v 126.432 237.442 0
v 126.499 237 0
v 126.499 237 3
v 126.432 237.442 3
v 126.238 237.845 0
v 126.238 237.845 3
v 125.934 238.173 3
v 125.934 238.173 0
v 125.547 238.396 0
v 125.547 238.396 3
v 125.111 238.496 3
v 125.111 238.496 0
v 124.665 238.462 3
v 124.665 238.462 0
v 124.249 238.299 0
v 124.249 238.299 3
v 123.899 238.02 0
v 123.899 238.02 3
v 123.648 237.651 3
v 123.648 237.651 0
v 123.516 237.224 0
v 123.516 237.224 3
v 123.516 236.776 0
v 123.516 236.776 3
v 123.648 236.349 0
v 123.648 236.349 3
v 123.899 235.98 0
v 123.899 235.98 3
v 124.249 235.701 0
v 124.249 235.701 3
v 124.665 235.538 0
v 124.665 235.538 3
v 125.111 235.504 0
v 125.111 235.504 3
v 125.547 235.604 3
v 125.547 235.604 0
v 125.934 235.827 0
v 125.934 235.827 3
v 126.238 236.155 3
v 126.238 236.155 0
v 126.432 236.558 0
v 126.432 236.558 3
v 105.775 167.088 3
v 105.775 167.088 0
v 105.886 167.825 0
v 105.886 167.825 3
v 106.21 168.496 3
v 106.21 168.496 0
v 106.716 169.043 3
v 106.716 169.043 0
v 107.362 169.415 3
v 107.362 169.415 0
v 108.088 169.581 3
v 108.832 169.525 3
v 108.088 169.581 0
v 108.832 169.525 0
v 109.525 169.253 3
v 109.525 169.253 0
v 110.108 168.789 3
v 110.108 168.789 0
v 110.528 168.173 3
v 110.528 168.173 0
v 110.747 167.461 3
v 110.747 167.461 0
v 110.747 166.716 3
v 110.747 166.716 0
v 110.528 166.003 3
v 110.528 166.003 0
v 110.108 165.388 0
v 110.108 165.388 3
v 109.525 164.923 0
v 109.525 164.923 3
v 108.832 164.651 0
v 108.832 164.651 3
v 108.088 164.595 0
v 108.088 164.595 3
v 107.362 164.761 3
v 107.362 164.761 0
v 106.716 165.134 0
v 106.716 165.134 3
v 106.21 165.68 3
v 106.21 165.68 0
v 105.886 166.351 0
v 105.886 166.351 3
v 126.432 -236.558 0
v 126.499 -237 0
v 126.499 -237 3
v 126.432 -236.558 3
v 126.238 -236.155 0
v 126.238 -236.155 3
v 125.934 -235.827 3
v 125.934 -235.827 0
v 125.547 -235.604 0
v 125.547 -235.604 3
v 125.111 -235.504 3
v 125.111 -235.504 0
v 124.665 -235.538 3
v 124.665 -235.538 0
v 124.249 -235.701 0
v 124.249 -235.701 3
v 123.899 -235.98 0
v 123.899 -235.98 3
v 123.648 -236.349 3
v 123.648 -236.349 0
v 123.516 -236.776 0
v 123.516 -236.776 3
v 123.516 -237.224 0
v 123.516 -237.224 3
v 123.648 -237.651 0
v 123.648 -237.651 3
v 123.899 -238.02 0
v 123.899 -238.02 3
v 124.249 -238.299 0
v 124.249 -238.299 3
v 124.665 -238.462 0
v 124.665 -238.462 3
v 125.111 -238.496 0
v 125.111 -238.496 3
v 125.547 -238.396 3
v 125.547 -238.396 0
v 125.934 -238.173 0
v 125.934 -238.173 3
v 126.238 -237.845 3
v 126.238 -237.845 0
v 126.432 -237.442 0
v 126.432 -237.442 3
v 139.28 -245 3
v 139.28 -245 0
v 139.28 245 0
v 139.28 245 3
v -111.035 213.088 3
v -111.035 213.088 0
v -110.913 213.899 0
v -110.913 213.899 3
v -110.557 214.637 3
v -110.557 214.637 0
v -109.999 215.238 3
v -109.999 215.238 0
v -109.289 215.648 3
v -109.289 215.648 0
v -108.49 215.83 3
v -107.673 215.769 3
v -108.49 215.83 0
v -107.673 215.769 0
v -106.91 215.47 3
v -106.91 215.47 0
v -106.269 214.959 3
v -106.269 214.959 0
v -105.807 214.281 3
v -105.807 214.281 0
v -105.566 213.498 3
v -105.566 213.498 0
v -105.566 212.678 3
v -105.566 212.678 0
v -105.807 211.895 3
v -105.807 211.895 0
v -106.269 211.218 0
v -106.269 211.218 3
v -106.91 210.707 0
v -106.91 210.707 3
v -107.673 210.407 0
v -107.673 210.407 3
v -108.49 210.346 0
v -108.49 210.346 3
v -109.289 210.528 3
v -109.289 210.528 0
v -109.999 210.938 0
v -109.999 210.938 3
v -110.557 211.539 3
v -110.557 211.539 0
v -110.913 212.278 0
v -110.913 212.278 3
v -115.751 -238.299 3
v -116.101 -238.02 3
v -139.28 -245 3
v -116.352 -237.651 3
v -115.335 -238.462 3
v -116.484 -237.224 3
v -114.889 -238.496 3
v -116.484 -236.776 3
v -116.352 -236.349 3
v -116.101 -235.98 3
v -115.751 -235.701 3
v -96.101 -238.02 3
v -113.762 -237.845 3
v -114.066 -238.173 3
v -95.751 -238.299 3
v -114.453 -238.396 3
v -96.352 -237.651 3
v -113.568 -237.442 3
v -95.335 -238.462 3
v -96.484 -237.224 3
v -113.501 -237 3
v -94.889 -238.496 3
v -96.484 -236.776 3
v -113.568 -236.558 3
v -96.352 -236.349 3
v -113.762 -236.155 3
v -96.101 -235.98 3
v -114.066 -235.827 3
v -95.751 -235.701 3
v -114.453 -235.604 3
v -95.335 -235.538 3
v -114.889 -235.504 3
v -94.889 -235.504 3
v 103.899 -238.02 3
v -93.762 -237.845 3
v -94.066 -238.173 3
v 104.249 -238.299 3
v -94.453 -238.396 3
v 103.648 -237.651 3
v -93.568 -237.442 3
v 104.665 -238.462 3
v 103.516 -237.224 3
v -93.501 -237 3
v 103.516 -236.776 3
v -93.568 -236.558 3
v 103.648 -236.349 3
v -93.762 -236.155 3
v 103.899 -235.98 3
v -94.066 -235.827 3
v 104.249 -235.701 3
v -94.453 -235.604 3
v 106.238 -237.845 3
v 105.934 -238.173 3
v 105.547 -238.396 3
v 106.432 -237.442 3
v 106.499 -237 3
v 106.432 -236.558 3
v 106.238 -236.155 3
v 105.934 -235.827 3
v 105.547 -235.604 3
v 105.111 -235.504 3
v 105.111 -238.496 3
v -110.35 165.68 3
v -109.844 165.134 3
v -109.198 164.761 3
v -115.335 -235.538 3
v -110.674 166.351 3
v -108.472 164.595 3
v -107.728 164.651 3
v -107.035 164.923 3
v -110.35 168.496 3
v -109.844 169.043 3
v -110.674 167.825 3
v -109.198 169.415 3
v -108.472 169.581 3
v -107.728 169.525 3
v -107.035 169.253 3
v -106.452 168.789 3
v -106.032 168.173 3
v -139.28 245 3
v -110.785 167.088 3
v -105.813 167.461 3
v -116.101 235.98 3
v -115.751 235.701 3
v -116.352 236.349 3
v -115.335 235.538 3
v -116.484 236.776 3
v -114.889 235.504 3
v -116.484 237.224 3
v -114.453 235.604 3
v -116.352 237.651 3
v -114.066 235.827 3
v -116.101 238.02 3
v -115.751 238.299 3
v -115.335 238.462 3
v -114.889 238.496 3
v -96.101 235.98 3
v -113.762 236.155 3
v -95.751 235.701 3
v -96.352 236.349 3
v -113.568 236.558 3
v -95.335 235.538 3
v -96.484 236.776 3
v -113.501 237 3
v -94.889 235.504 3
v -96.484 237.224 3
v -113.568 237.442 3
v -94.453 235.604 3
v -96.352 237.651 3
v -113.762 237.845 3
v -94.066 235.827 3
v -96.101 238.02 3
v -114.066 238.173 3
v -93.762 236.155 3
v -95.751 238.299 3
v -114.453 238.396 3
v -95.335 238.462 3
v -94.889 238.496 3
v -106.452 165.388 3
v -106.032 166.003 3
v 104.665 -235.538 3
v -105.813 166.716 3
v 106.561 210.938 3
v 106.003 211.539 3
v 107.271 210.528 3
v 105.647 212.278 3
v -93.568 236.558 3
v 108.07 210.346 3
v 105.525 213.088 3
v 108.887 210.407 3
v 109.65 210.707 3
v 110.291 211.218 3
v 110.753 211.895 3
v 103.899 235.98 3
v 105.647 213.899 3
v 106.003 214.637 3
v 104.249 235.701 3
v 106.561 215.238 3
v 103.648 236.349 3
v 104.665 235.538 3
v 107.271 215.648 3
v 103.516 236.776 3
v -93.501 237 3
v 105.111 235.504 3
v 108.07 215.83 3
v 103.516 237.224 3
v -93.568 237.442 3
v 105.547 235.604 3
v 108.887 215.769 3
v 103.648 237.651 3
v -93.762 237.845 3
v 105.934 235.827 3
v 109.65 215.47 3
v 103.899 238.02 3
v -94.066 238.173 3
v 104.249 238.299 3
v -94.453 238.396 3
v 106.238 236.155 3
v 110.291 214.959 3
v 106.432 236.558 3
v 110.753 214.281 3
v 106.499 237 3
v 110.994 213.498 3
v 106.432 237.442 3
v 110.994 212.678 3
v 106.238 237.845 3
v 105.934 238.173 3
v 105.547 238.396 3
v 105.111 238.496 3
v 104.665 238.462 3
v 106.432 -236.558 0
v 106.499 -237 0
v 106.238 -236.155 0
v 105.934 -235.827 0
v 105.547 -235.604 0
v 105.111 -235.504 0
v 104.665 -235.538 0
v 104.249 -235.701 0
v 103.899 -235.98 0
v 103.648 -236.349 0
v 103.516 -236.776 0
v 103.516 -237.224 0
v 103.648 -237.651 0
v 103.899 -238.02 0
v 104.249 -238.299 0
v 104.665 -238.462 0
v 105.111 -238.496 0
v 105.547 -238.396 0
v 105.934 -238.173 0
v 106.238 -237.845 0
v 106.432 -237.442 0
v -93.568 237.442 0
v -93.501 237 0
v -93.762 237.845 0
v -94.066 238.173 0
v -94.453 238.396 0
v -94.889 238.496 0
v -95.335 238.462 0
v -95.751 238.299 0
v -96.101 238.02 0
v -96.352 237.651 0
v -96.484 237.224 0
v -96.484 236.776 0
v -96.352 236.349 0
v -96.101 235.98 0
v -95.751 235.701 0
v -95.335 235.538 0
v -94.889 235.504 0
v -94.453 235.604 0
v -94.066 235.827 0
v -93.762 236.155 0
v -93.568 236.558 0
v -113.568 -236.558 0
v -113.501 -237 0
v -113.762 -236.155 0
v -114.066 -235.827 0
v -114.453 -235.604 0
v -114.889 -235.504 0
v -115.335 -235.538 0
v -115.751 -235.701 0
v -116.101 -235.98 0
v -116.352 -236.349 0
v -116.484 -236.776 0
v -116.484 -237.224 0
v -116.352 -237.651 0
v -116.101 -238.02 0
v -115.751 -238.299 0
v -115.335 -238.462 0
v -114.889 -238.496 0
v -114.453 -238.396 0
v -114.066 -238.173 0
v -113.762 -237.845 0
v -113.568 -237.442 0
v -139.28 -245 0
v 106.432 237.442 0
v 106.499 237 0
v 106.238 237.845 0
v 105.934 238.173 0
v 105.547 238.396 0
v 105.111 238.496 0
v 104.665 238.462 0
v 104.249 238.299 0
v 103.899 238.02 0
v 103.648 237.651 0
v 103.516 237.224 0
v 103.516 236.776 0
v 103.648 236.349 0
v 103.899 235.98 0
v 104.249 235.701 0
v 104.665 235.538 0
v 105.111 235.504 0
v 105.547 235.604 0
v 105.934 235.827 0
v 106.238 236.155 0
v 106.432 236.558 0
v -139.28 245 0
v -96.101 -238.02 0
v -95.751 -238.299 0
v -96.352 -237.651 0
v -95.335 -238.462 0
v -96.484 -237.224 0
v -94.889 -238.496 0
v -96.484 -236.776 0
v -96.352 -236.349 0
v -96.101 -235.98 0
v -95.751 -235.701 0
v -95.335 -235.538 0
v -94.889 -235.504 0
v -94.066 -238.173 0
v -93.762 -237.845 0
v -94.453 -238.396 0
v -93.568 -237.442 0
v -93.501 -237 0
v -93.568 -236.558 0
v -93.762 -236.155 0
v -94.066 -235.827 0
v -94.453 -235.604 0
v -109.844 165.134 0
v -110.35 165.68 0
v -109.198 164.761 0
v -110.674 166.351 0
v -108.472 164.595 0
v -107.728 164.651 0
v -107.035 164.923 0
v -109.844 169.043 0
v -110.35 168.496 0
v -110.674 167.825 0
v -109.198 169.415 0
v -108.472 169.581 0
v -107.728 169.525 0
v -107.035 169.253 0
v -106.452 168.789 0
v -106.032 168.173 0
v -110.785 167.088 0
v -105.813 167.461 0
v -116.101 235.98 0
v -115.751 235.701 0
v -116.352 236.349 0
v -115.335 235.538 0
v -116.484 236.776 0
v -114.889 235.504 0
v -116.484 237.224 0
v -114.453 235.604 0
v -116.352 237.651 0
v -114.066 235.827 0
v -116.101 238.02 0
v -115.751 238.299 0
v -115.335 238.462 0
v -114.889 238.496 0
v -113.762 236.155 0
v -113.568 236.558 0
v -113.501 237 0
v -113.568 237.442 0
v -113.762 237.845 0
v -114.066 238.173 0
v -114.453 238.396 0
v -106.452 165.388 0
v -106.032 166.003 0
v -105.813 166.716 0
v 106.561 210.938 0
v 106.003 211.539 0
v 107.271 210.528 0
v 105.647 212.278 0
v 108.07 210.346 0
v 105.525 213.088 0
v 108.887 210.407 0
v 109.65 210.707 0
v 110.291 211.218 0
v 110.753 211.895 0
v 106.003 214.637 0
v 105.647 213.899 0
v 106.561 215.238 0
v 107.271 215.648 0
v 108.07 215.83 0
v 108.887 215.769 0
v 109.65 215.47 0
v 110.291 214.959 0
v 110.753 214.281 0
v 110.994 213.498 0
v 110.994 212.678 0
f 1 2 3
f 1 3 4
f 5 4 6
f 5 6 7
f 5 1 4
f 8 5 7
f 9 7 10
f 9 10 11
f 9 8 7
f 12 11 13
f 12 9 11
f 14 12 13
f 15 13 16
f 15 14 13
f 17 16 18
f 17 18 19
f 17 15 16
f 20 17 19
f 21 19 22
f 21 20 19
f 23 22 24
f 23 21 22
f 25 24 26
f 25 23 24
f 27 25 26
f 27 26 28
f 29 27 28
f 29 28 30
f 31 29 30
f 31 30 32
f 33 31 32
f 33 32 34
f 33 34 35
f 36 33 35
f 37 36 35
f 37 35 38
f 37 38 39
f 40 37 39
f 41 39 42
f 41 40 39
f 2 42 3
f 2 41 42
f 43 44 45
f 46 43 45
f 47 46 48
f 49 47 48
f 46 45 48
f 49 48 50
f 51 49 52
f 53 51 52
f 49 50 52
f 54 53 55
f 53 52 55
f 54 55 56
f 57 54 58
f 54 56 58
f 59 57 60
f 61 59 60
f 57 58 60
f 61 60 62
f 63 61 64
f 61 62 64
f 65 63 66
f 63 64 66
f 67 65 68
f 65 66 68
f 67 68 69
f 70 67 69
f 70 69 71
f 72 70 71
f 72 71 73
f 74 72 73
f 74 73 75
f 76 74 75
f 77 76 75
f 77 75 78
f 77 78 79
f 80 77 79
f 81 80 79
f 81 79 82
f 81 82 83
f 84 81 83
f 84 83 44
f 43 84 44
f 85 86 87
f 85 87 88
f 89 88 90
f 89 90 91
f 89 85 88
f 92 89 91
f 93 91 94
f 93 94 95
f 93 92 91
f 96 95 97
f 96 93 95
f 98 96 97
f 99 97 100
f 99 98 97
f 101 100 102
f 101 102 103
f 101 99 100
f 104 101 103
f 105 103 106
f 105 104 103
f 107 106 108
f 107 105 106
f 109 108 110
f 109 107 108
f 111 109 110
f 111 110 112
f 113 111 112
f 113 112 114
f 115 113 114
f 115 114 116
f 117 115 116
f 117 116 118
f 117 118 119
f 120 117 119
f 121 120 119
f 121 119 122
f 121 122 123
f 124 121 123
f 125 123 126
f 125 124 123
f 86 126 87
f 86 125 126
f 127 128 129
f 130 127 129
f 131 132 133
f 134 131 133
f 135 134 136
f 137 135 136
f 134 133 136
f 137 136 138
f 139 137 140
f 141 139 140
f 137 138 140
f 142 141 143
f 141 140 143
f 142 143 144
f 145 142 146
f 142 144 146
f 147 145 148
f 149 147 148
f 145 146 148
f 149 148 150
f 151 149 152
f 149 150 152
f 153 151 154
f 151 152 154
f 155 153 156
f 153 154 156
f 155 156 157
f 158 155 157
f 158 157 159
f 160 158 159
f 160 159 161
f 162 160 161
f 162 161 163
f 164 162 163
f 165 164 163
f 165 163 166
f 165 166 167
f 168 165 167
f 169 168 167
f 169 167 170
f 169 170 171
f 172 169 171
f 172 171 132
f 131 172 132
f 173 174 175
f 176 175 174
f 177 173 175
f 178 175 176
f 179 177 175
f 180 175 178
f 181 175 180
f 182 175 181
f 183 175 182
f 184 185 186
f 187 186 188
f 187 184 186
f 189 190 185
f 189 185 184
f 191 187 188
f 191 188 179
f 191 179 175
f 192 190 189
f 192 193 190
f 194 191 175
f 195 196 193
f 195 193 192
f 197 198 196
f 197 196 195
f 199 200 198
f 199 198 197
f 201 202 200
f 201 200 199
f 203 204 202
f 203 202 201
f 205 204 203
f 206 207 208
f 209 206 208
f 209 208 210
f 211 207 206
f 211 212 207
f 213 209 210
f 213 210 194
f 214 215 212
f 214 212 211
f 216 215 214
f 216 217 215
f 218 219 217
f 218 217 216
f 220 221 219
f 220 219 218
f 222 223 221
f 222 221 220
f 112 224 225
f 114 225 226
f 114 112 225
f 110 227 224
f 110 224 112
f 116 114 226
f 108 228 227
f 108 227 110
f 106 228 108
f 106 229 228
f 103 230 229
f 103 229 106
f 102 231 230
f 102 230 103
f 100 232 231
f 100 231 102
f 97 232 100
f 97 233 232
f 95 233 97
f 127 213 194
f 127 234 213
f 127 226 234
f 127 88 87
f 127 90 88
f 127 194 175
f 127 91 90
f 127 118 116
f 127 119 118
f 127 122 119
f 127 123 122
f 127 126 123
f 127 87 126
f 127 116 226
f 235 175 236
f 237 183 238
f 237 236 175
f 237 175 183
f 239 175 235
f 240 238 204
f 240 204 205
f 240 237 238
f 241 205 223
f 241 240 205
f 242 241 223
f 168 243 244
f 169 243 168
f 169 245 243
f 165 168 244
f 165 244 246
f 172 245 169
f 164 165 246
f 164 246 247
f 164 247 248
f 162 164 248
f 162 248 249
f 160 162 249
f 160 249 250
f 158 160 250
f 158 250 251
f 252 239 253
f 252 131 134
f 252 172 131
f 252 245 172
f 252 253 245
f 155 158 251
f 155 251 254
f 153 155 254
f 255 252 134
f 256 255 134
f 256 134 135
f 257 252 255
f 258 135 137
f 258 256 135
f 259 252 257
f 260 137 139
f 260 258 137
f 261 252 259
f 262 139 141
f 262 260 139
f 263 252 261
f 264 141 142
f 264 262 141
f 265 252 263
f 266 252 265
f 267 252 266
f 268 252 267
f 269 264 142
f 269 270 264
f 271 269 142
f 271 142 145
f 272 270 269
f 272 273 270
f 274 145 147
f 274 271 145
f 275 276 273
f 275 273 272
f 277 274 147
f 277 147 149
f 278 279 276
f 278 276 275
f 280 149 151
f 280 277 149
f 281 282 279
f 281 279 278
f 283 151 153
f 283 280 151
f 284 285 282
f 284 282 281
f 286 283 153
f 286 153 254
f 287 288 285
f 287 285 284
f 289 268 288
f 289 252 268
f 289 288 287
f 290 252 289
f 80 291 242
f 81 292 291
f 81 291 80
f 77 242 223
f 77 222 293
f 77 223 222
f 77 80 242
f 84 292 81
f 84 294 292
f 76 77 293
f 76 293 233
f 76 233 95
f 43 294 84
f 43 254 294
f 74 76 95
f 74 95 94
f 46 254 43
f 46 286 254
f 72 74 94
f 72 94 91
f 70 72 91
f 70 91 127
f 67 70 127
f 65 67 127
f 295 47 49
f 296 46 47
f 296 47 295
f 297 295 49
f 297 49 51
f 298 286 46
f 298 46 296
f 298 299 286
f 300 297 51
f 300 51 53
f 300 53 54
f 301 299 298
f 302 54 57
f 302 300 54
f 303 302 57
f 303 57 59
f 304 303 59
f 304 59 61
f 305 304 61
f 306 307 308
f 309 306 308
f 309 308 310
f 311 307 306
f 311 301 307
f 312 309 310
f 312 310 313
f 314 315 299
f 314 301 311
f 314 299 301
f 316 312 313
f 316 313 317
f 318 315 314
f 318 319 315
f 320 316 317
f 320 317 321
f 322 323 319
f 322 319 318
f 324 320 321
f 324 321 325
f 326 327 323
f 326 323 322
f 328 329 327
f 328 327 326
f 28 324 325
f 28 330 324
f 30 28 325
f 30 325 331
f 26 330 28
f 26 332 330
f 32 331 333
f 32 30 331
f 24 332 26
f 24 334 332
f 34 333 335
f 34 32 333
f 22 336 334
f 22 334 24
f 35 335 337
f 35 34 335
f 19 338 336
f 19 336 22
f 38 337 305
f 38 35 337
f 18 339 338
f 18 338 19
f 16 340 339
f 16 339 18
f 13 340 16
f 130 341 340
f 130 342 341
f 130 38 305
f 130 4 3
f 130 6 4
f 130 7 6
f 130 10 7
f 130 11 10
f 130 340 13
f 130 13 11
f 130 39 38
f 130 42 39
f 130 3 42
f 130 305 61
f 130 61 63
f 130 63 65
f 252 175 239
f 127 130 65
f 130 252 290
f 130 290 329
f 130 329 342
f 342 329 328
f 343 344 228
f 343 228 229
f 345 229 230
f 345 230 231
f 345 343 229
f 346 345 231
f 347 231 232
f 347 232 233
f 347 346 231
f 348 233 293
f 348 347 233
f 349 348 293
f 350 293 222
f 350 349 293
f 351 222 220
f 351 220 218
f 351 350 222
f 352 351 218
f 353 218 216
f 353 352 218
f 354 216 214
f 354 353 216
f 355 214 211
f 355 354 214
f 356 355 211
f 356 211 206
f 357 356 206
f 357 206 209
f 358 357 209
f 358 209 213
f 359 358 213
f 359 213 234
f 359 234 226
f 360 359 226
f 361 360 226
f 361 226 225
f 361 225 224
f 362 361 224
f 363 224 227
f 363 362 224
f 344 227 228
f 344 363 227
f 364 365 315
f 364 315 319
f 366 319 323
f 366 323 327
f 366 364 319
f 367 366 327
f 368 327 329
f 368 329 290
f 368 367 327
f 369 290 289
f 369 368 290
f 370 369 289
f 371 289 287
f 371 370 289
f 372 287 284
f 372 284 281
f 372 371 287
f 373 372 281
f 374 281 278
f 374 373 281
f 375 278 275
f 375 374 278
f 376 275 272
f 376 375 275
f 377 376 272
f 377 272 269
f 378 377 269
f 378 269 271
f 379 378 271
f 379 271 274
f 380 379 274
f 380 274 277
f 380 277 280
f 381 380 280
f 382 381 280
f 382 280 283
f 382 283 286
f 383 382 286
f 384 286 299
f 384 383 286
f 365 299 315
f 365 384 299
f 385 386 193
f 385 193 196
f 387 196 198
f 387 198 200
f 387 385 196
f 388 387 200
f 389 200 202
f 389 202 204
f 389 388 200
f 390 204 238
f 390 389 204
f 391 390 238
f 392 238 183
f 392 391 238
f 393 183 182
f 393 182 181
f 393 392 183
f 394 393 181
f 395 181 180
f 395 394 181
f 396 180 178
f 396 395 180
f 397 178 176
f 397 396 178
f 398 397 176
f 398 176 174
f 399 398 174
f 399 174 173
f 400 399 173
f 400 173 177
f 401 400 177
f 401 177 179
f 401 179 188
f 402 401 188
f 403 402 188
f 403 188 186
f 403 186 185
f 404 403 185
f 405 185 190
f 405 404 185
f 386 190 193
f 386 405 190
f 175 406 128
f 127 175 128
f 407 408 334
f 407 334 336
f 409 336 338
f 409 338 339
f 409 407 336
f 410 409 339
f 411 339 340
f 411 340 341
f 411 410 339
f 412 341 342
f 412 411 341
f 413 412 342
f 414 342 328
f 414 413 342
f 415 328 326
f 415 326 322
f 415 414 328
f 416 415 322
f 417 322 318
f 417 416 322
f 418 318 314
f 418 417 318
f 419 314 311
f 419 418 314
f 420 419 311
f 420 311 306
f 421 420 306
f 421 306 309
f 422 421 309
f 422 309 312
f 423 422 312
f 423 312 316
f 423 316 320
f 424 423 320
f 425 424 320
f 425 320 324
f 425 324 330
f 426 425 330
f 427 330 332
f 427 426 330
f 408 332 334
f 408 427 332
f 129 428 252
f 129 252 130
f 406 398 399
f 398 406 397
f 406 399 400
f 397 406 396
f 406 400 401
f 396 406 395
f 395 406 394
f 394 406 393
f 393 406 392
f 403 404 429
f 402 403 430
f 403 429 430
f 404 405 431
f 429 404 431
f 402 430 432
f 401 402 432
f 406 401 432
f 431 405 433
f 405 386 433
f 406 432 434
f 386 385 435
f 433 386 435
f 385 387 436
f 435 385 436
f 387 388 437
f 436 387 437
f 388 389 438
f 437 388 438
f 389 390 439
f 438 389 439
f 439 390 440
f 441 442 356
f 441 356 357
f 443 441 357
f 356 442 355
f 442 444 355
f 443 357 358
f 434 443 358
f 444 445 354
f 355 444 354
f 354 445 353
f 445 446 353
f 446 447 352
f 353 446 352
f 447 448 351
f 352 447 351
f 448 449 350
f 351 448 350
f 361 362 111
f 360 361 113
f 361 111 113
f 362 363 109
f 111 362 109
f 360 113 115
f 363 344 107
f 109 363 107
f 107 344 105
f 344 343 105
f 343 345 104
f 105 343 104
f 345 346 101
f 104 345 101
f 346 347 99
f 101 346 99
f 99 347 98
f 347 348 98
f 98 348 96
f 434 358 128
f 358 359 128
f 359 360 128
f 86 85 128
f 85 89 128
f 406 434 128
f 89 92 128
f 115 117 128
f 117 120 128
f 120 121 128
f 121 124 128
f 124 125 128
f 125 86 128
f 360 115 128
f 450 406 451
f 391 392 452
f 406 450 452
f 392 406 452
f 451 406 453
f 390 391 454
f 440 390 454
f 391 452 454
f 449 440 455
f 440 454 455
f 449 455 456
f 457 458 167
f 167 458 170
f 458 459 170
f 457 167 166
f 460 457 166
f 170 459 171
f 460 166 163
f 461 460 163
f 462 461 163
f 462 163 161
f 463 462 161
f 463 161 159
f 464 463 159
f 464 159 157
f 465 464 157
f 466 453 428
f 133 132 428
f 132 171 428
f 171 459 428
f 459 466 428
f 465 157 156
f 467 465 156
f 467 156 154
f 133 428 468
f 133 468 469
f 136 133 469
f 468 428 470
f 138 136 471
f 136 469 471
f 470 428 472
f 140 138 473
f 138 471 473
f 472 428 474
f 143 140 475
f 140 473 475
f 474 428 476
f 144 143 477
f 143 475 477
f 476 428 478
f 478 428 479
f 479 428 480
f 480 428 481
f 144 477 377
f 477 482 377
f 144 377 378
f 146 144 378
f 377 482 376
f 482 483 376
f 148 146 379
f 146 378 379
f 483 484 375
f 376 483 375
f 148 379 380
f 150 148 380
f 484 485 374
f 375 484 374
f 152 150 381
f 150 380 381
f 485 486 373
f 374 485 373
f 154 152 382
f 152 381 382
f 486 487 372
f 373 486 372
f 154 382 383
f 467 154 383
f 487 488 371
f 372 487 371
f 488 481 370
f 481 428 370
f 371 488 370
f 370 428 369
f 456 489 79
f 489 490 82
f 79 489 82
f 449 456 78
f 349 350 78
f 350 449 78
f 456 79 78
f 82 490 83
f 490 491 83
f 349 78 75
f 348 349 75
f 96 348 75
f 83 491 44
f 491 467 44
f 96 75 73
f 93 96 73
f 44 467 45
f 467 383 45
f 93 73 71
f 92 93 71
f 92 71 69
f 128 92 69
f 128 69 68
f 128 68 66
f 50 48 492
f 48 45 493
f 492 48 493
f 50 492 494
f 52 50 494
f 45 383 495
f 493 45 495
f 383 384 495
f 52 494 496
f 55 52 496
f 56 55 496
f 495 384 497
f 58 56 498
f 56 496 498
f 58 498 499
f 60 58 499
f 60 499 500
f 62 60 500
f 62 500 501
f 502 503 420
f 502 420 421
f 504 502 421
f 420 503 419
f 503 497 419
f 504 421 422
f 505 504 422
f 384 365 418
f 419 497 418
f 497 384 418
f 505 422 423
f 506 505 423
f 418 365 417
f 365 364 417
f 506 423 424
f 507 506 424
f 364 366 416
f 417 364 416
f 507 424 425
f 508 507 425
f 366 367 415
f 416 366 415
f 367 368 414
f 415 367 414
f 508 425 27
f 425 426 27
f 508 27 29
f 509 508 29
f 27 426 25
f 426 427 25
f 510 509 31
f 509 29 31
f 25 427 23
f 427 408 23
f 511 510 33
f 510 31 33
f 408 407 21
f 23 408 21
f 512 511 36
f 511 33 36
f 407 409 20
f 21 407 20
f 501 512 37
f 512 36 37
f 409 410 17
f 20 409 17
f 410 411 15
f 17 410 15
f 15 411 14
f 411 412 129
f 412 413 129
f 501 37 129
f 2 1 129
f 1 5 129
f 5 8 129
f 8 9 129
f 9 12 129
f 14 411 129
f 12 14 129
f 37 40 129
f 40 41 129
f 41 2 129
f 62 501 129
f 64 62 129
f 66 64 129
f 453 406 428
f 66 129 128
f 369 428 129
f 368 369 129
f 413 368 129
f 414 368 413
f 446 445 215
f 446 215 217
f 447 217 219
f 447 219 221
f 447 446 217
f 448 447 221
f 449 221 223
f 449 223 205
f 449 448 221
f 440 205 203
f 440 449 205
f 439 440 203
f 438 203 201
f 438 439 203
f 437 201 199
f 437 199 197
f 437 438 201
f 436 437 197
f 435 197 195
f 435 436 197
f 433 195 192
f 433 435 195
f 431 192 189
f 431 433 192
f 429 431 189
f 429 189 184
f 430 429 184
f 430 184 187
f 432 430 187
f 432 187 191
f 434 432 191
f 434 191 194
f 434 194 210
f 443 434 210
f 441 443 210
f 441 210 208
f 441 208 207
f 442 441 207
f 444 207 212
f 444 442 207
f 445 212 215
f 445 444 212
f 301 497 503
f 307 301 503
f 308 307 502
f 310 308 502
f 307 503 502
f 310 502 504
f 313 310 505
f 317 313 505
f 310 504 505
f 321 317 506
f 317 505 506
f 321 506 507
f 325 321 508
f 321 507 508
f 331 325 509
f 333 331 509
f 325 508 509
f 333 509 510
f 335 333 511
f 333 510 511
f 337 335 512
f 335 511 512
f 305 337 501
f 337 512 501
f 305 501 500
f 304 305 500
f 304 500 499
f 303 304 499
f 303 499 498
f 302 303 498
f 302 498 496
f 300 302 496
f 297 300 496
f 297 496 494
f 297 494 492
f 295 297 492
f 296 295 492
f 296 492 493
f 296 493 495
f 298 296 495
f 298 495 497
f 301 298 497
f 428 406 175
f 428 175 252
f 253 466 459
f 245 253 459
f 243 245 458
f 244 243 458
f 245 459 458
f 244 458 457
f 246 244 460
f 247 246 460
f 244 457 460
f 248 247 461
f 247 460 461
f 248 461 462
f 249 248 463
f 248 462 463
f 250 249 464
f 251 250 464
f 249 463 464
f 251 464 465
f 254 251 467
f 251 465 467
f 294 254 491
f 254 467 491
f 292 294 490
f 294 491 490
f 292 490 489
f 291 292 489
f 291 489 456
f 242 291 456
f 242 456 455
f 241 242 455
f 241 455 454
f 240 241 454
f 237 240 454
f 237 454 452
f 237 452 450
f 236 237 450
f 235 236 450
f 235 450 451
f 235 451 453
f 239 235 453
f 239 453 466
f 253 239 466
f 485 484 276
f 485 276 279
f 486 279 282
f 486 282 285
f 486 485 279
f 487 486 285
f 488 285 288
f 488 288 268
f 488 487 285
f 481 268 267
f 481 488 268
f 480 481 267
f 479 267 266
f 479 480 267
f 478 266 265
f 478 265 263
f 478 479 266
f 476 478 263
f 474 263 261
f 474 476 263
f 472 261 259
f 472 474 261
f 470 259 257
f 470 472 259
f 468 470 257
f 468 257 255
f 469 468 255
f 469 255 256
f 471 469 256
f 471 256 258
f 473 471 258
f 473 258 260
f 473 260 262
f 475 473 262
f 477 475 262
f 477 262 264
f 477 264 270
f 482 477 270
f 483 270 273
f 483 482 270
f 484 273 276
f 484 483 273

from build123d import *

# Parameters (mm, degrees)
SKETCH_1_W               = 278.56
SKETCH_1_H               = 490
SKETCH_1_R               = 1.5
EXTRUDE_1_DEPTH          = 3
SKETCH_2_R               = 2.5
CUT_EXTRUDE_1_DEPTH      = 10
SKETCH_3_R               = 2.75
CUT_EXTRUDE_2_DEPTH      = 1
CUT_EXTRUDE_2_DEPTH_BACK = 4


with BuildPart() as part:
    # 草图1 → 凸台-拉伸1 (new body)
    with BuildSketch(Plane.XY):
        Rectangle(SKETCH_1_W, SKETCH_1_H)
        with Locations((104.999070074, 237)):
            Circle(SKETCH_1_R, mode=Mode.SUBTRACT)
        with Locations((124.999070074, 237)):
            Circle(SKETCH_1_R, mode=Mode.SUBTRACT)
        with Locations((-95.000929926, 237)):
            Circle(SKETCH_1_R, mode=Mode.SUBTRACT)
        with Locations((-115.000929926, 237)):
            Circle(SKETCH_1_R, mode=Mode.SUBTRACT)
        with Locations((124.999070074, -237)):
            Circle(SKETCH_1_R, mode=Mode.SUBTRACT)
        with Locations((104.999070074, -237)):
            Circle(SKETCH_1_R, mode=Mode.SUBTRACT)
        with Locations((-95.000929926, -237)):
            Circle(SKETCH_1_R, mode=Mode.SUBTRACT)
        with Locations((-115.000929926, -237)):
            Circle(SKETCH_1_R, mode=Mode.SUBTRACT)
    extrude(amount=EXTRUDE_1_DEPTH)

    # 草图2 → 切除-拉伸1 (cut)
    with BuildSketch(Plane(origin=(0, 0, 0), x_dir=(-1, 0, 0), z_dir=(0, 0, -1))):
        with Locations((-108.275205997, 167.088125342)):
            Circle(SKETCH_2_R)
        with Locations((108.284794003, 167.088125342)):
            Circle(SKETCH_2_R)
    extrude(amount=-CUT_EXTRUDE_1_DEPTH, mode=Mode.SUBTRACT)

    # 草图3 → 切除-拉伸2 (cut, two sides)
    with BuildSketch(Plane(origin=(0, 0, 0), x_dir=(-1, 0, 0), z_dir=(0, 0, -1))) as cut_extrude_2_sk:
        with Locations((108.284794003, 213.088125342)):
            Circle(SKETCH_3_R)
        with Locations((-108.275205997, 213.088125342)):
            Circle(SKETCH_3_R)
    extrude(amount=CUT_EXTRUDE_2_DEPTH, mode=Mode.SUBTRACT)
    extrude(cut_extrude_2_sk.sketch, amount=-CUT_EXTRUDE_2_DEPTH_BACK, mode=Mode.SUBTRACT)


solid = part.part
